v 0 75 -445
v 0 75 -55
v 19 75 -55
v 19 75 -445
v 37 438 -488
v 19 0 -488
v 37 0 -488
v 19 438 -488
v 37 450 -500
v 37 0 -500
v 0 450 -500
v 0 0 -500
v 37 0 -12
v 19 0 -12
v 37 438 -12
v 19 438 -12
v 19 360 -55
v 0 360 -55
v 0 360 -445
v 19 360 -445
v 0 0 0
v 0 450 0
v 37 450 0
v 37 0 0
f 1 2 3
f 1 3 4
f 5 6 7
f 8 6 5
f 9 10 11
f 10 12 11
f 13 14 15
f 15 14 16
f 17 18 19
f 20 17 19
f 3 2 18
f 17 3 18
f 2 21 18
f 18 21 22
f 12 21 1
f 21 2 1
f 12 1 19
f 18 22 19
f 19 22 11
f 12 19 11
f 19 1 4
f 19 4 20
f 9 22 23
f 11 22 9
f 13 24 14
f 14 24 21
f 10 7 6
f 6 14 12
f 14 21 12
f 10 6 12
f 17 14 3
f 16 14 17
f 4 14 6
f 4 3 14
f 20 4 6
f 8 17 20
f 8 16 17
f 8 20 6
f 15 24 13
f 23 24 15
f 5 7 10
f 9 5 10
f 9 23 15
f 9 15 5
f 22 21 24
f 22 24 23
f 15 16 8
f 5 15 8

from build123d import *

# Parameters (mm, degrees)
SKETCH1_W           = 500
SKETCH1_H           = 450
SKETCH1_W_2         = 390
SKETCH1_H_2         = 285
BOSS_EXTRUDE1_DEPTH = 19
SKETCH2_W           = 12
SKETCH2_H           = 438
BOSS_EXTRUDE4_DEPTH = 18
SKETCH3_W           = 500
SKETCH3_H           = 12
BOSS_EXTRUDE5_DEPTH = 18
SKETCH4_W           = 12
SKETCH4_H           = 438
BOSS_EXTRUDE6_DEPTH = 18


with BuildPart() as part:
    # Sketch1 → Boss-Extrude1 (new body)
    with BuildSketch(Plane(origin=(0, 0, 0), x_dir=(0, 0, -1), z_dir=(1, 0, 0))):
        with Locations((250, 225)):
            Rectangle(SKETCH1_W, SKETCH1_H)
        with Locations((250, 217.5)):
            Rectangle(SKETCH1_W_2, SKETCH1_H_2, mode=Mode.SUBTRACT)
    extrude(amount=BOSS_EXTRUDE1_DEPTH)

    # Sketch2 → Boss-Extrude4 (add)
    with BuildSketch(Plane(origin=(19, 0, 0), x_dir=(0, 0, -1), z_dir=(1, 0, 0))):
        with Locations((6, 219)):
            Rectangle(SKETCH2_W, SKETCH2_H)
    extrude(amount=BOSS_EXTRUDE4_DEPTH)

    # Sketch3 → Boss-Extrude5 (add)
    with BuildSketch(Plane(origin=(19, 0, 0), x_dir=(0, 0, -1), z_dir=(1, 0, 0))):
        with Locations((250, 444)):
            Rectangle(SKETCH3_W, SKETCH3_H)
    extrude(amount=BOSS_EXTRUDE5_DEPTH)

    # Sketch4 → Boss-Extrude6 (add)
    with BuildSketch(Plane(origin=(19, 0, 0), x_dir=(0, 0, -1), z_dir=(1, 0, 0))):
        with Locations((494, 219)):
            Rectangle(SKETCH4_W, SKETCH4_H)
    extrude(amount=BOSS_EXTRUDE6_DEPTH)


solid = part.part
